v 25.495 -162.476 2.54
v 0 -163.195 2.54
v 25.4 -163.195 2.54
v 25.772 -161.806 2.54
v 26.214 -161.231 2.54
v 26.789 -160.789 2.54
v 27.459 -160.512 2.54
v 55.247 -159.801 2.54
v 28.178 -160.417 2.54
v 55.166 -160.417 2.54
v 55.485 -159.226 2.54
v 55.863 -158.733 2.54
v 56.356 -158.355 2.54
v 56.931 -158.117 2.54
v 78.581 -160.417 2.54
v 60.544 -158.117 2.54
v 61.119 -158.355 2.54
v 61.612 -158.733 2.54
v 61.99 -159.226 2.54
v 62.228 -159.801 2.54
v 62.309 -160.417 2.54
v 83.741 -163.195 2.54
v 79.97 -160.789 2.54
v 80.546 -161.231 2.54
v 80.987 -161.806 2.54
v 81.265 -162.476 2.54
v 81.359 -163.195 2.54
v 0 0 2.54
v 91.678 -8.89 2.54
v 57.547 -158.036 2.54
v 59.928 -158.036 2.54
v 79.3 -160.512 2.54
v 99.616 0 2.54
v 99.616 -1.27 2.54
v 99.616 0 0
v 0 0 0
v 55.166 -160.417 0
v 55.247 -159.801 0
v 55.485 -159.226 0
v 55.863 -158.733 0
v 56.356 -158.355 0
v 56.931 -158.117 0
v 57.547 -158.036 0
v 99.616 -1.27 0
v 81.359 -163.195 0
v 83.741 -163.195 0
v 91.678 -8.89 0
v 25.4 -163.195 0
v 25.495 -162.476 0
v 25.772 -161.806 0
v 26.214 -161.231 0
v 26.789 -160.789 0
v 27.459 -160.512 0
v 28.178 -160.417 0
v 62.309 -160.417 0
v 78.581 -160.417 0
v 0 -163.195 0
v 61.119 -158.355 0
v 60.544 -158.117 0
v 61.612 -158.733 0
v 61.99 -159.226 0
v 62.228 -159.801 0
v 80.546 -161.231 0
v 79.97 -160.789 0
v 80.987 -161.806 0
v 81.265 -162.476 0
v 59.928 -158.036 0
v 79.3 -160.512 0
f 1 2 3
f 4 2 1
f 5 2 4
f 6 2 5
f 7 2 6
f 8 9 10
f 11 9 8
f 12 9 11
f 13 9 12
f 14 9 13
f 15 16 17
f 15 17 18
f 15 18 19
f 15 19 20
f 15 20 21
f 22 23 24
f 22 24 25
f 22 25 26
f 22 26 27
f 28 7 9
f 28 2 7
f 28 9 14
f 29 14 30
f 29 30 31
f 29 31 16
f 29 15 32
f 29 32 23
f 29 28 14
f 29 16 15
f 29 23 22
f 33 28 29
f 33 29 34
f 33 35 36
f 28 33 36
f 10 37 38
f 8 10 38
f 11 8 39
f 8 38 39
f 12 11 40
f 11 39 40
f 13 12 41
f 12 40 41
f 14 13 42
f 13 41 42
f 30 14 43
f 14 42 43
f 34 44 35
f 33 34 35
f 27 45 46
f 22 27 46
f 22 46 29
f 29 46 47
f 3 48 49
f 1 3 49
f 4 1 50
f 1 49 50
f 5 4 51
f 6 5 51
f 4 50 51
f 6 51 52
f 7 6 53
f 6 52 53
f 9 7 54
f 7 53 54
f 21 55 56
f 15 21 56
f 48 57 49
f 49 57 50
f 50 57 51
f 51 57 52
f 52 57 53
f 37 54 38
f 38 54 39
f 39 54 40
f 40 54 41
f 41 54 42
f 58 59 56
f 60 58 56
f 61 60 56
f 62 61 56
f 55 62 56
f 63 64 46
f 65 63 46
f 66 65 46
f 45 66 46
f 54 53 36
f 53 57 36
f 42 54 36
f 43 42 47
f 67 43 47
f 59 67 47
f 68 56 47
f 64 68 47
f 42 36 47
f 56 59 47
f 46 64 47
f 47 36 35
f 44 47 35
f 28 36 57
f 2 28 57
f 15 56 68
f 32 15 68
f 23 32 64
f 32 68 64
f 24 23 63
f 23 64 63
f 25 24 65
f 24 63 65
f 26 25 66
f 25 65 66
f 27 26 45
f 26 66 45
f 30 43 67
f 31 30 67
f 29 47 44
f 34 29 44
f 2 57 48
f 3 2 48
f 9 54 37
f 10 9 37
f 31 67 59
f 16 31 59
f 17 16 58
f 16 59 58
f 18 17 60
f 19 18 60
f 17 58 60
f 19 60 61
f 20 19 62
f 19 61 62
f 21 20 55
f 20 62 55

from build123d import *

# Parameters (mm, degrees)
F1_DEPTH = 2.54


with BuildPart() as f1:
    # F0 (on Top) → F1 (new body)
    with BuildSketch(Plane.XY):
        with BuildLine():
            Line((99.615625, 0), (0, 0))
            Line((0, 0), (0, -163.195))
            Line((0, -163.195), (25.4, -163.195))
            ThreePointArc((25.4, -163.195), (26.213694, -161.230569), (28.178125, -160.416875))
            Line((28.178125, -160.416875), (55.165625, -160.416875))
            ThreePointArc((55.165625, -160.416875), (55.863077, -158.733077), (57.546875, -158.035625))
            Line((57.546875, -158.035625), (59.928125, -158.035625))
            ThreePointArc((59.928125, -158.035625), (61.611923, -158.733077), (62.309375, -160.416875))
            Line((62.309375, -160.416875), (78.58125, -160.416875))
            ThreePointArc((78.58125, -160.416875), (80.545681, -161.230569), (81.359375, -163.195))
            Line((81.359375, -163.195), (83.740625, -163.195))
            Line((83.740625, -163.195), (91.678125, -8.89))
            Line((91.678125, -8.89), (99.615625, -1.27))
            Line((99.615625, -1.27), (99.615625, 0))
        make_face()
    extrude(amount=F1_DEPTH)


solid = f1.part
